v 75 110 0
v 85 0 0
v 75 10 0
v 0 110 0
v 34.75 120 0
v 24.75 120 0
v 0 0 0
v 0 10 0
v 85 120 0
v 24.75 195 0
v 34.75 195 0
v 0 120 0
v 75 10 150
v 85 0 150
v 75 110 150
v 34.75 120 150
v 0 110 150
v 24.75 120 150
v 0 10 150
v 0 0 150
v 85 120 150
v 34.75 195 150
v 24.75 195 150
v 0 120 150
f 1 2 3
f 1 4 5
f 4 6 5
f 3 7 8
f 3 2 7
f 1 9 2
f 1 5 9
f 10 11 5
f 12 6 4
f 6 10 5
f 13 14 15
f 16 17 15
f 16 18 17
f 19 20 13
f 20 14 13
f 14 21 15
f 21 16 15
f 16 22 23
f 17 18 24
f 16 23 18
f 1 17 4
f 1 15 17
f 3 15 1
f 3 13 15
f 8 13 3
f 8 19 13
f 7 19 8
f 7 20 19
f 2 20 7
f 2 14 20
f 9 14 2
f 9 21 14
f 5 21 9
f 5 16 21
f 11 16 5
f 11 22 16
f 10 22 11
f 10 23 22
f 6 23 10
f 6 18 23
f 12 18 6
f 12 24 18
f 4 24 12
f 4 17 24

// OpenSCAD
width = 100;
length = 150;
ledge = 75;
thickness = 10;
tall = 75;

linear_extrude(height = length) union()
{
    square([ tall, thickness ]);
    translate([ 0, width + thickness, 0 ]) square([ tall, thickness ]);
    translate([ tall, 0, 0 ]) square([ thickness, width + (thickness * 2) ]);
    translate([ tall * .33, width + (2 * thickness), 0 ]) square([ thickness, ledge ]);
}
// translate([ width + thickness, 0, 0 ]) cube([ thickness, length, tall ]);

// difference()
// {
//     difference()
//     {
//         translate([ 0, 0, -thickness ]) cube([ width + ledge, length, thickness ]);
//         rotate([ 0, -1, 0 ]) translate([ 0, 0, 2 * -thickness ]) cube([ width + ledge, length, thickness ]);
//     };
//     translate([ width + (ledge * .66), 1 * (length / 10), -thickness ]) cylinder(h = thickness, r = 2);
//     // translate([ width + (ledge * .66), 2 * (length / 10), -thickness ]) cylinder(h = thickness, r = 2);
//     translate([ width + (ledge * .66), 3 * (length / 10), -thickness ]) cylinder(h = thickness, r = 2);
//     // translate([ width + (ledge * .66), 4 * (length / 10), -thickness ]) cylinder(h = thickness, r = 2);
//     translate([ width + (ledge * .66), 5 * (length / 10), -thickness ]) cylinder(h = thickness, r = 2);
//     // translate([ width + (ledge * .66), 6 * (length / 10), -thickness ]) cylinder(h = thickness, r = 2);
//     translate([ width + (ledge * .66), 7 * (length / 10), -thickness ]) cylinder(h = thickness, r = 2);
//     // translate([ width + (ledge * .66), 8 * (length / 10), -thickness ]) cylinder(h = thickness, r = 2);
//     translate([ width + (ledge * .66), 9 * (length / 10), -thickness ]) cylinder(h = thickness, r = 2);
// }
